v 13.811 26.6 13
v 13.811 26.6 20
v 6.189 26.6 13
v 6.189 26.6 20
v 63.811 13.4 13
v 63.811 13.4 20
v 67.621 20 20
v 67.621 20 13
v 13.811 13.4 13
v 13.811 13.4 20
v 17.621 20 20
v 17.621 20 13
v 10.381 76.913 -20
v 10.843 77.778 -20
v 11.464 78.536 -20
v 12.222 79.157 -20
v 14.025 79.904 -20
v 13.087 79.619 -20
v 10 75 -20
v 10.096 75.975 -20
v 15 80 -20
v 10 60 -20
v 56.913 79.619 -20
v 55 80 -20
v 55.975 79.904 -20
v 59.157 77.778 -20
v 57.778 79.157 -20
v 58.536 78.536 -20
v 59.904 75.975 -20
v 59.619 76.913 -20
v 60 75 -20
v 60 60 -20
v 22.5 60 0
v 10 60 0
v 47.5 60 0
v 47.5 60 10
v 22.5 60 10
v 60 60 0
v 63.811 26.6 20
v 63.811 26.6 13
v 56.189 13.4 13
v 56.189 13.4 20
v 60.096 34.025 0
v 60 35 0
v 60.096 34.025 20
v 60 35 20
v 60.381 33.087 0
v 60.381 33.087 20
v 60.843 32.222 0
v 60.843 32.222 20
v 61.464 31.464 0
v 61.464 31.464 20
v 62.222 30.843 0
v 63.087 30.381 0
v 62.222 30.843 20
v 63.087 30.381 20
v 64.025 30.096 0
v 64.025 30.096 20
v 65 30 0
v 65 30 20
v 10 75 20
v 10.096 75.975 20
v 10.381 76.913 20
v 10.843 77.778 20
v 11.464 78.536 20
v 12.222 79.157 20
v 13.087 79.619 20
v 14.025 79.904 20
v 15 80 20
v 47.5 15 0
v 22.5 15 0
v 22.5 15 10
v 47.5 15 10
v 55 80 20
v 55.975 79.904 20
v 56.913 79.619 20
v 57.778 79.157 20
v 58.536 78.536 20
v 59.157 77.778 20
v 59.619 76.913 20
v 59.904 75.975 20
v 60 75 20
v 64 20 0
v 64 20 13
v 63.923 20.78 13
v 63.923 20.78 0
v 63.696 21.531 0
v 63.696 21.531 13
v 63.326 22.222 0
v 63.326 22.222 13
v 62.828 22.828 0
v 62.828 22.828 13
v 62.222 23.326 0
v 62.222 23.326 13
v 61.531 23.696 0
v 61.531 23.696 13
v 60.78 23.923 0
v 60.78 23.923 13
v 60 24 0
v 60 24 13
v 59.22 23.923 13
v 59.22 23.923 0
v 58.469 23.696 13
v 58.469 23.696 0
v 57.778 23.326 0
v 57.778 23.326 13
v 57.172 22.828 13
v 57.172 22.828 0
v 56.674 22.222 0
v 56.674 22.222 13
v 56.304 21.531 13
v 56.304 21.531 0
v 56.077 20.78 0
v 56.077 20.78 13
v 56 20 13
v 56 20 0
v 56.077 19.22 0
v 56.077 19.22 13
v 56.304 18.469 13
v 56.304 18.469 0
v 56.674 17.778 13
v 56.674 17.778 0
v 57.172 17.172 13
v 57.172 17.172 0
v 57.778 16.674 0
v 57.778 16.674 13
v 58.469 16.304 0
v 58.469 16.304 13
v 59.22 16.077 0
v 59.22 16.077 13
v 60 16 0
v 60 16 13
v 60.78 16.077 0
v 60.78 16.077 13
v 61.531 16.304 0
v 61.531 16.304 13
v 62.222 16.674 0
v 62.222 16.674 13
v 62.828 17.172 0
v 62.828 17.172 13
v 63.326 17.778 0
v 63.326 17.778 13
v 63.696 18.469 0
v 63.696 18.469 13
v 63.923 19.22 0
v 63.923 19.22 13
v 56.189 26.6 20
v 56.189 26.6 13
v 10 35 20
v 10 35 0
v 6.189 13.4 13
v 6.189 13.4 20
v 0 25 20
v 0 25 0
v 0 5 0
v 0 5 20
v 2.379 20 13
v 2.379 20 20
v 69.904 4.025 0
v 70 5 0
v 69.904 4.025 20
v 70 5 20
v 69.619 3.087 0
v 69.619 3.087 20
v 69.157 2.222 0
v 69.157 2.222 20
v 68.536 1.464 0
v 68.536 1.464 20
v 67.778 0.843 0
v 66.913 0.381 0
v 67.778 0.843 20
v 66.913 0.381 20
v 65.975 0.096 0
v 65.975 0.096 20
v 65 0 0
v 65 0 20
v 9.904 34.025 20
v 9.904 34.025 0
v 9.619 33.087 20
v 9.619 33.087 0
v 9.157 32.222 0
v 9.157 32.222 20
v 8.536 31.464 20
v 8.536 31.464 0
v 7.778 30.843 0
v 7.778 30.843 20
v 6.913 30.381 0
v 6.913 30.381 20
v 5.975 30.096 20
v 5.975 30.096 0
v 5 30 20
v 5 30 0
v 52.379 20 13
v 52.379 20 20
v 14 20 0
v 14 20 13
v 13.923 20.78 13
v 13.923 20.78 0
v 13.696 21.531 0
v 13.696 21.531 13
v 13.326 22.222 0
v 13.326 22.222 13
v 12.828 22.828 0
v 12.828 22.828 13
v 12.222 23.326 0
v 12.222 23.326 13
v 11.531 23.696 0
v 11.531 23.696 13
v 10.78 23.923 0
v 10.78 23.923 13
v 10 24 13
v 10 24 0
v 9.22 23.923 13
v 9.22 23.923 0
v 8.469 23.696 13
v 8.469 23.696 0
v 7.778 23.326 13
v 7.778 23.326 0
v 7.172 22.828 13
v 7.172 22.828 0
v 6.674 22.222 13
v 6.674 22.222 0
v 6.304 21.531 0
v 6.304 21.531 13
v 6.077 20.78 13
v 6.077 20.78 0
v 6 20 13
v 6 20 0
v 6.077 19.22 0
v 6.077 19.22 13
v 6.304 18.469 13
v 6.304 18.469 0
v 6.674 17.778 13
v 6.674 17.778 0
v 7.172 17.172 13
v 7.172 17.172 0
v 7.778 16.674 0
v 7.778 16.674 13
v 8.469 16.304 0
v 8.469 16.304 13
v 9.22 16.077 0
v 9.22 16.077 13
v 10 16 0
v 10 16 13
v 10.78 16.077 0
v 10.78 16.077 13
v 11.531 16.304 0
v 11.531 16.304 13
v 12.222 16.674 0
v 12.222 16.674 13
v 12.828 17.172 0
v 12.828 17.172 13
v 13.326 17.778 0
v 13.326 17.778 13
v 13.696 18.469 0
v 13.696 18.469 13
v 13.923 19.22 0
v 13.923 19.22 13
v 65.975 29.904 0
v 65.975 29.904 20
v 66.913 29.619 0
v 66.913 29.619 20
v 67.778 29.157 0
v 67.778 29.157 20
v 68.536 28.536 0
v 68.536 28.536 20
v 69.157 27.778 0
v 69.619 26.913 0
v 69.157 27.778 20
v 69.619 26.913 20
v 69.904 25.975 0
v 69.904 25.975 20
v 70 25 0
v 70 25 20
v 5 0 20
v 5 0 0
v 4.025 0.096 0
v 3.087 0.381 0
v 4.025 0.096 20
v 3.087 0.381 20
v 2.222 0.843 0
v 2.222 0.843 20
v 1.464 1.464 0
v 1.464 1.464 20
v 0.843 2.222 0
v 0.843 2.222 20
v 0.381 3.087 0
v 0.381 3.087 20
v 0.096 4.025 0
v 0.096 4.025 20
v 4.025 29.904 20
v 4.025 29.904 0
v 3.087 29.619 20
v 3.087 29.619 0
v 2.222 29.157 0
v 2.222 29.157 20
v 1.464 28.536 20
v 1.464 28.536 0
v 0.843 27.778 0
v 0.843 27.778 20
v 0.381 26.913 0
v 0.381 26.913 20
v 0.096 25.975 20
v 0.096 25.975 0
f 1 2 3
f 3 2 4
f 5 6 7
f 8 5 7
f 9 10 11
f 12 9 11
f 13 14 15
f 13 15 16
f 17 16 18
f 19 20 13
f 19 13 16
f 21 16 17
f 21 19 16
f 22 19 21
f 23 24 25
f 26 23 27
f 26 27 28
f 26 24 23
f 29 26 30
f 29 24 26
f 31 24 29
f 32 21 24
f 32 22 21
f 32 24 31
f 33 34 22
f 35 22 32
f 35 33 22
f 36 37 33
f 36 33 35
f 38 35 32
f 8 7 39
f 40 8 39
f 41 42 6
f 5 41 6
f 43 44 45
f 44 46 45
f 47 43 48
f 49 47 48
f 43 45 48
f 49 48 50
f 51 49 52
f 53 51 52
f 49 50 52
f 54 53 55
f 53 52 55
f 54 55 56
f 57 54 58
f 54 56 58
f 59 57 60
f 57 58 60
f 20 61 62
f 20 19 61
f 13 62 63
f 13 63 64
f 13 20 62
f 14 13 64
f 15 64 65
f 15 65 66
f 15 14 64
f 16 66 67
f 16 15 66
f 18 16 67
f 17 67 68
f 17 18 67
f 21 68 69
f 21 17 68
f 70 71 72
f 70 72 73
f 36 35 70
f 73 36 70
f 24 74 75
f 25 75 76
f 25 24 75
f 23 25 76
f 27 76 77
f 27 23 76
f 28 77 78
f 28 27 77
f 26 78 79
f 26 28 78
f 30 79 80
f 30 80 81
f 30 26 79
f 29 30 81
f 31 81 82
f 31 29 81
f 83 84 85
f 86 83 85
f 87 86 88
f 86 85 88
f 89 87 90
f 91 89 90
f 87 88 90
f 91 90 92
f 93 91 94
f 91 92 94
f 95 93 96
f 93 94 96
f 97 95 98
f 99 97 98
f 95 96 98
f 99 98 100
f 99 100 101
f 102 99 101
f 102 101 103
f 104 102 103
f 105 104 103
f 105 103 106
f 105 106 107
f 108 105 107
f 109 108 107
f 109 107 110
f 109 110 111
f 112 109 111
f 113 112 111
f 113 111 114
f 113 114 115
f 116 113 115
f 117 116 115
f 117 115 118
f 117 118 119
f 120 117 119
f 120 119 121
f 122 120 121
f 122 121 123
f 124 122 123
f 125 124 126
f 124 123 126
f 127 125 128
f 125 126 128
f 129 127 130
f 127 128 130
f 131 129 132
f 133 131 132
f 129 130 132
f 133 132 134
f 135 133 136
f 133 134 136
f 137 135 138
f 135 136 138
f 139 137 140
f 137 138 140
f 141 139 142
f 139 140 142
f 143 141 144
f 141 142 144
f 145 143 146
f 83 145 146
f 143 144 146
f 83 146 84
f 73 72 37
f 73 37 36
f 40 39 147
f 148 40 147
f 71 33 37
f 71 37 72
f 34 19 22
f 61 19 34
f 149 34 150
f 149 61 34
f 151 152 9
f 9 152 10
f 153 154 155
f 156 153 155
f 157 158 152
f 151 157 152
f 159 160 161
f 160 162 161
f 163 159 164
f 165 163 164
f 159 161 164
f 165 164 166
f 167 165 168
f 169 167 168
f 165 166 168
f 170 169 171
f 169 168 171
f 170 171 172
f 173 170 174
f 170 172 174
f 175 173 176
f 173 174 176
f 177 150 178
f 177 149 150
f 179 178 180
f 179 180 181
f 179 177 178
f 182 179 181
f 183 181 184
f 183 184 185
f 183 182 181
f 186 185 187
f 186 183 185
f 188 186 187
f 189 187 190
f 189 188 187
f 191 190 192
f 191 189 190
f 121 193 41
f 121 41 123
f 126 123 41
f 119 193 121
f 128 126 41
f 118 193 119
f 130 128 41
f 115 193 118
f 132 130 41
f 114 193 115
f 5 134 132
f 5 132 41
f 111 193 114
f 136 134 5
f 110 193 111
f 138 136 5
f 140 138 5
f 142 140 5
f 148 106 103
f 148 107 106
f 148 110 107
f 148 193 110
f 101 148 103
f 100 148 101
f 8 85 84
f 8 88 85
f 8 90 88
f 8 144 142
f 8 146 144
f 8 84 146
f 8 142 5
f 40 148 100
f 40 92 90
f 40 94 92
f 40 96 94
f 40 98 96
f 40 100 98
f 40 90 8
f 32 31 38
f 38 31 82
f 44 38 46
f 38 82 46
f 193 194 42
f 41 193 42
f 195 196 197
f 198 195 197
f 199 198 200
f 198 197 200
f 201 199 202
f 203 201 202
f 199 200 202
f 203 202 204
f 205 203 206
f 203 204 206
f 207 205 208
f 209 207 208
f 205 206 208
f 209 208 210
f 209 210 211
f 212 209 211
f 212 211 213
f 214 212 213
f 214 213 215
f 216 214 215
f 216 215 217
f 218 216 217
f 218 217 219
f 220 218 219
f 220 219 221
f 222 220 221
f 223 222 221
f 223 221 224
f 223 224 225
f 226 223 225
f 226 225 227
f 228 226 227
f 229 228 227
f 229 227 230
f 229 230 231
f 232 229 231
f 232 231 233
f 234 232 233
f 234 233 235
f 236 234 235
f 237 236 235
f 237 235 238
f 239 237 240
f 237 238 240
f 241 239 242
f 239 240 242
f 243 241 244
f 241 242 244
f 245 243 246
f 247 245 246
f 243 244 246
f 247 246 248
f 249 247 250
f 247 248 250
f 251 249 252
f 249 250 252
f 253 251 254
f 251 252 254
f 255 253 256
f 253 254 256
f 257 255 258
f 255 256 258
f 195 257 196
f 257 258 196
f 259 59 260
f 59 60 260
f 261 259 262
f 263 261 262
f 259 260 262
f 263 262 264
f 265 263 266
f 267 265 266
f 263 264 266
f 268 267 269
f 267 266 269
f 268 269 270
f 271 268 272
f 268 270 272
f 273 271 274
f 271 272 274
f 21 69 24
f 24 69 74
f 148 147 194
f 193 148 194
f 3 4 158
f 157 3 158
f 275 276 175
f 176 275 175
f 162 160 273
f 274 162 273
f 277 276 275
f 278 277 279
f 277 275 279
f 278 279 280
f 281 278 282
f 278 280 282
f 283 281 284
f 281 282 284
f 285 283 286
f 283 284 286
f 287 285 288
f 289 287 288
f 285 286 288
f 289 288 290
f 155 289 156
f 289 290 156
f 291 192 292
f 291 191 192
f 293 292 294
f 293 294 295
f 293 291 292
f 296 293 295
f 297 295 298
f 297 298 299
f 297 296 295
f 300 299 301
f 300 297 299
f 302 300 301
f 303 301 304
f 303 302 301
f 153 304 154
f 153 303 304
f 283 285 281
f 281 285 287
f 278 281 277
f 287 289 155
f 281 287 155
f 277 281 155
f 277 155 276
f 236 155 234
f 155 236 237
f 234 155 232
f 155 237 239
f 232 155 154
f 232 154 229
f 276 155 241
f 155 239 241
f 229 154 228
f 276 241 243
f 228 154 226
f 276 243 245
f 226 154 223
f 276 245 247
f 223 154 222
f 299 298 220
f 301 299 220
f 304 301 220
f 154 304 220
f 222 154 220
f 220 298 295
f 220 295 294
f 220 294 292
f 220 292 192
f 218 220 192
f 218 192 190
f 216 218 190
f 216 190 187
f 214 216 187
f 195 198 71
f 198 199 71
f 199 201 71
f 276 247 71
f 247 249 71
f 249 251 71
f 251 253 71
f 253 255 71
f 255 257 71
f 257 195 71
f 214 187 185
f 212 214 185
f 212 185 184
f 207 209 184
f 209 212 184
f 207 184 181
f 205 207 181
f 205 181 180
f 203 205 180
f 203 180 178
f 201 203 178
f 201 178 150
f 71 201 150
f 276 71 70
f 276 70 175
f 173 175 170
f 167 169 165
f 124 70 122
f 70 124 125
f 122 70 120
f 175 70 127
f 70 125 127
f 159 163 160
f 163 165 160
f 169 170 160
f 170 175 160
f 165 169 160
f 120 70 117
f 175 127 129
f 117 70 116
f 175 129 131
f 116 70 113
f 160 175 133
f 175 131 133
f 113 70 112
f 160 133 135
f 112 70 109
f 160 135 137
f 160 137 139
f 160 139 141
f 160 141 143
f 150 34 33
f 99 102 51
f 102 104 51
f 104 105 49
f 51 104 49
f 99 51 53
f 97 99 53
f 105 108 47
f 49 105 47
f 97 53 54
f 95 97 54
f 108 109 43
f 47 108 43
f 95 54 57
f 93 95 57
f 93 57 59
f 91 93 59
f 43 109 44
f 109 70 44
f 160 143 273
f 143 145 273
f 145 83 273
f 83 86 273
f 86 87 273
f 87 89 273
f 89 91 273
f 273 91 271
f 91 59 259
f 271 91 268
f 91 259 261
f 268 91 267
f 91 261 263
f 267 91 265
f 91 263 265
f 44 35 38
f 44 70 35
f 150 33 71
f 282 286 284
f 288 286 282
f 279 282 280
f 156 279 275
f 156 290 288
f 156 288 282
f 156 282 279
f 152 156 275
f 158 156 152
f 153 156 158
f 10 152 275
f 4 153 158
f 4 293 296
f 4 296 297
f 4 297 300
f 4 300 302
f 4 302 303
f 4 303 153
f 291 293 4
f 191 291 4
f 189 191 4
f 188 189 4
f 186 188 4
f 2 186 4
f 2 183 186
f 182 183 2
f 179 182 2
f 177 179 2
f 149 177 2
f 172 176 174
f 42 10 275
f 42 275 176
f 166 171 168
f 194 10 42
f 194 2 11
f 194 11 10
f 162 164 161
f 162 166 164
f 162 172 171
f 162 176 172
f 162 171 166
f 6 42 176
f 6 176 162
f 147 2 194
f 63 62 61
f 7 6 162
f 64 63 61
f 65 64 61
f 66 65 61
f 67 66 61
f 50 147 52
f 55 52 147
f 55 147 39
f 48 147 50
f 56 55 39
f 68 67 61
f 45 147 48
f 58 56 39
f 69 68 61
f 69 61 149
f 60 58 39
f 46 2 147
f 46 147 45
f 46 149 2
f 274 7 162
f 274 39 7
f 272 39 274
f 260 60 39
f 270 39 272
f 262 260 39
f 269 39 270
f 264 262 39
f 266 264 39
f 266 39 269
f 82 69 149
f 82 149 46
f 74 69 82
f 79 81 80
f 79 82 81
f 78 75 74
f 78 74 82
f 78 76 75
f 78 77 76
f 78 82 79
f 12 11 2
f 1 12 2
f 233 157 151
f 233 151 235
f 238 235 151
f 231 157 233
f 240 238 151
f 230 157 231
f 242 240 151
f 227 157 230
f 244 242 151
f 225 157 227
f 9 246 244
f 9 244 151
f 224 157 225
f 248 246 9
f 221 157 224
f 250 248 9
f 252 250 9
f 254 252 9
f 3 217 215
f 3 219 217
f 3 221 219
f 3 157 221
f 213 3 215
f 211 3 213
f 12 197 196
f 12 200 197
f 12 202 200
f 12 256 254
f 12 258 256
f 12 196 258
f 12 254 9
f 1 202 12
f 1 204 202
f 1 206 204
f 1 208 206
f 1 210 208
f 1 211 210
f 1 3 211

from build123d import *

# Parameters (mm, degrees)
F1_DEPTH  = 20
F3_DEPTH  = 7
F4_R      = 4
F5_DEPTH  = 13.001
F6_R      = 4
F7_DEPTH  = 20.001
F8_W      = 50
F8_H      = 20
F9_DEPTH  = 20
F10_W     = 25
F10_H     = 45
F11_DEPTH = 10
F12_R     = 4.99999


# Not quite as in the source:
# - a fillet or chamfer is up to 0.001 mm smaller than in the source, because OpenCascade refuses the exact size


with BuildPart() as f1:
    # F0 (on Top) → F1 (new body)
    with BuildSketch(Plane.XY):
        Polygon((0, 30), (0, 0), (70, 0), (70, 30), (60, 30), (60, 80), (10, 80), (10, 30), align=None)
    extrude(amount=F1_DEPTH)

    # F2 (on face) → F3 (cut)
    with BuildSketch(Plane.XY.offset(20)):
        Polygon((63.8105117767, 13.4), (67.6210235533, 20), (63.8105117767, 26.6), (56.1894882233, 26.6), (52.3789764467, 20), (56.1894882233, 13.4), align=None)
        Polygon((17.6210235533, 20), (13.8105117767, 26.6), (6.1894882233, 26.6), (2.3789764467, 20), (6.1894882233, 13.4), (13.8105117767, 13.4), align=None)
    extrude(amount=-F3_DEPTH, mode=Mode.SUBTRACT)

    # F4 (on face) → F5 (cut, through all)
    with BuildSketch(Plane.XY.offset(13)):
        with Locations((10, 20)):
            Circle(F4_R)
    extrude(amount=-F5_DEPTH, mode=Mode.SUBTRACT)

    # F6 (on face) → F7 (cut, through all)
    with BuildSketch(Plane.XY.offset(20)):
        with Locations((60, 20)):
            Circle(F6_R)
    extrude(amount=-F7_DEPTH, mode=Mode.SUBTRACT)

    # F8 (on face) → F9 (join)
    with BuildSketch(Plane(origin=(0, 0, 0), x_dir=(1, 0, 0), z_dir=(0, 0, -1))):
        with Locations((35, -70)):
            Rectangle(F8_W, F8_H)
    extrude(amount=F9_DEPTH)

    # F10 (on face) → F11 (cut)
    with BuildSketch(Plane(origin=(0, 0, 0), x_dir=(1, 0, 0), z_dir=(0, 0, -1))):
        with Locations((35, -37.5)):
            Rectangle(F10_W, F10_H)
    extrude(amount=-F11_DEPTH, mode=Mode.SUBTRACT)

    # F12 (radius 5 in the source; OpenCascade refuses exactly that, so slightly less here)
    f12_edges = [f1.edges().sort_by_distance(p)[0] for p in [
        (10, 80, 0),
        (10, 30, 10),
        (60, 30, 10),
        (70, 30, 10),
        (70, 0, 10),
        (0, 0, 10),
        (0, 30, 10),
        (60, 80, 0),
    ]]
    fillet(f12_edges, radius=F12_R)


solid = f1.part
